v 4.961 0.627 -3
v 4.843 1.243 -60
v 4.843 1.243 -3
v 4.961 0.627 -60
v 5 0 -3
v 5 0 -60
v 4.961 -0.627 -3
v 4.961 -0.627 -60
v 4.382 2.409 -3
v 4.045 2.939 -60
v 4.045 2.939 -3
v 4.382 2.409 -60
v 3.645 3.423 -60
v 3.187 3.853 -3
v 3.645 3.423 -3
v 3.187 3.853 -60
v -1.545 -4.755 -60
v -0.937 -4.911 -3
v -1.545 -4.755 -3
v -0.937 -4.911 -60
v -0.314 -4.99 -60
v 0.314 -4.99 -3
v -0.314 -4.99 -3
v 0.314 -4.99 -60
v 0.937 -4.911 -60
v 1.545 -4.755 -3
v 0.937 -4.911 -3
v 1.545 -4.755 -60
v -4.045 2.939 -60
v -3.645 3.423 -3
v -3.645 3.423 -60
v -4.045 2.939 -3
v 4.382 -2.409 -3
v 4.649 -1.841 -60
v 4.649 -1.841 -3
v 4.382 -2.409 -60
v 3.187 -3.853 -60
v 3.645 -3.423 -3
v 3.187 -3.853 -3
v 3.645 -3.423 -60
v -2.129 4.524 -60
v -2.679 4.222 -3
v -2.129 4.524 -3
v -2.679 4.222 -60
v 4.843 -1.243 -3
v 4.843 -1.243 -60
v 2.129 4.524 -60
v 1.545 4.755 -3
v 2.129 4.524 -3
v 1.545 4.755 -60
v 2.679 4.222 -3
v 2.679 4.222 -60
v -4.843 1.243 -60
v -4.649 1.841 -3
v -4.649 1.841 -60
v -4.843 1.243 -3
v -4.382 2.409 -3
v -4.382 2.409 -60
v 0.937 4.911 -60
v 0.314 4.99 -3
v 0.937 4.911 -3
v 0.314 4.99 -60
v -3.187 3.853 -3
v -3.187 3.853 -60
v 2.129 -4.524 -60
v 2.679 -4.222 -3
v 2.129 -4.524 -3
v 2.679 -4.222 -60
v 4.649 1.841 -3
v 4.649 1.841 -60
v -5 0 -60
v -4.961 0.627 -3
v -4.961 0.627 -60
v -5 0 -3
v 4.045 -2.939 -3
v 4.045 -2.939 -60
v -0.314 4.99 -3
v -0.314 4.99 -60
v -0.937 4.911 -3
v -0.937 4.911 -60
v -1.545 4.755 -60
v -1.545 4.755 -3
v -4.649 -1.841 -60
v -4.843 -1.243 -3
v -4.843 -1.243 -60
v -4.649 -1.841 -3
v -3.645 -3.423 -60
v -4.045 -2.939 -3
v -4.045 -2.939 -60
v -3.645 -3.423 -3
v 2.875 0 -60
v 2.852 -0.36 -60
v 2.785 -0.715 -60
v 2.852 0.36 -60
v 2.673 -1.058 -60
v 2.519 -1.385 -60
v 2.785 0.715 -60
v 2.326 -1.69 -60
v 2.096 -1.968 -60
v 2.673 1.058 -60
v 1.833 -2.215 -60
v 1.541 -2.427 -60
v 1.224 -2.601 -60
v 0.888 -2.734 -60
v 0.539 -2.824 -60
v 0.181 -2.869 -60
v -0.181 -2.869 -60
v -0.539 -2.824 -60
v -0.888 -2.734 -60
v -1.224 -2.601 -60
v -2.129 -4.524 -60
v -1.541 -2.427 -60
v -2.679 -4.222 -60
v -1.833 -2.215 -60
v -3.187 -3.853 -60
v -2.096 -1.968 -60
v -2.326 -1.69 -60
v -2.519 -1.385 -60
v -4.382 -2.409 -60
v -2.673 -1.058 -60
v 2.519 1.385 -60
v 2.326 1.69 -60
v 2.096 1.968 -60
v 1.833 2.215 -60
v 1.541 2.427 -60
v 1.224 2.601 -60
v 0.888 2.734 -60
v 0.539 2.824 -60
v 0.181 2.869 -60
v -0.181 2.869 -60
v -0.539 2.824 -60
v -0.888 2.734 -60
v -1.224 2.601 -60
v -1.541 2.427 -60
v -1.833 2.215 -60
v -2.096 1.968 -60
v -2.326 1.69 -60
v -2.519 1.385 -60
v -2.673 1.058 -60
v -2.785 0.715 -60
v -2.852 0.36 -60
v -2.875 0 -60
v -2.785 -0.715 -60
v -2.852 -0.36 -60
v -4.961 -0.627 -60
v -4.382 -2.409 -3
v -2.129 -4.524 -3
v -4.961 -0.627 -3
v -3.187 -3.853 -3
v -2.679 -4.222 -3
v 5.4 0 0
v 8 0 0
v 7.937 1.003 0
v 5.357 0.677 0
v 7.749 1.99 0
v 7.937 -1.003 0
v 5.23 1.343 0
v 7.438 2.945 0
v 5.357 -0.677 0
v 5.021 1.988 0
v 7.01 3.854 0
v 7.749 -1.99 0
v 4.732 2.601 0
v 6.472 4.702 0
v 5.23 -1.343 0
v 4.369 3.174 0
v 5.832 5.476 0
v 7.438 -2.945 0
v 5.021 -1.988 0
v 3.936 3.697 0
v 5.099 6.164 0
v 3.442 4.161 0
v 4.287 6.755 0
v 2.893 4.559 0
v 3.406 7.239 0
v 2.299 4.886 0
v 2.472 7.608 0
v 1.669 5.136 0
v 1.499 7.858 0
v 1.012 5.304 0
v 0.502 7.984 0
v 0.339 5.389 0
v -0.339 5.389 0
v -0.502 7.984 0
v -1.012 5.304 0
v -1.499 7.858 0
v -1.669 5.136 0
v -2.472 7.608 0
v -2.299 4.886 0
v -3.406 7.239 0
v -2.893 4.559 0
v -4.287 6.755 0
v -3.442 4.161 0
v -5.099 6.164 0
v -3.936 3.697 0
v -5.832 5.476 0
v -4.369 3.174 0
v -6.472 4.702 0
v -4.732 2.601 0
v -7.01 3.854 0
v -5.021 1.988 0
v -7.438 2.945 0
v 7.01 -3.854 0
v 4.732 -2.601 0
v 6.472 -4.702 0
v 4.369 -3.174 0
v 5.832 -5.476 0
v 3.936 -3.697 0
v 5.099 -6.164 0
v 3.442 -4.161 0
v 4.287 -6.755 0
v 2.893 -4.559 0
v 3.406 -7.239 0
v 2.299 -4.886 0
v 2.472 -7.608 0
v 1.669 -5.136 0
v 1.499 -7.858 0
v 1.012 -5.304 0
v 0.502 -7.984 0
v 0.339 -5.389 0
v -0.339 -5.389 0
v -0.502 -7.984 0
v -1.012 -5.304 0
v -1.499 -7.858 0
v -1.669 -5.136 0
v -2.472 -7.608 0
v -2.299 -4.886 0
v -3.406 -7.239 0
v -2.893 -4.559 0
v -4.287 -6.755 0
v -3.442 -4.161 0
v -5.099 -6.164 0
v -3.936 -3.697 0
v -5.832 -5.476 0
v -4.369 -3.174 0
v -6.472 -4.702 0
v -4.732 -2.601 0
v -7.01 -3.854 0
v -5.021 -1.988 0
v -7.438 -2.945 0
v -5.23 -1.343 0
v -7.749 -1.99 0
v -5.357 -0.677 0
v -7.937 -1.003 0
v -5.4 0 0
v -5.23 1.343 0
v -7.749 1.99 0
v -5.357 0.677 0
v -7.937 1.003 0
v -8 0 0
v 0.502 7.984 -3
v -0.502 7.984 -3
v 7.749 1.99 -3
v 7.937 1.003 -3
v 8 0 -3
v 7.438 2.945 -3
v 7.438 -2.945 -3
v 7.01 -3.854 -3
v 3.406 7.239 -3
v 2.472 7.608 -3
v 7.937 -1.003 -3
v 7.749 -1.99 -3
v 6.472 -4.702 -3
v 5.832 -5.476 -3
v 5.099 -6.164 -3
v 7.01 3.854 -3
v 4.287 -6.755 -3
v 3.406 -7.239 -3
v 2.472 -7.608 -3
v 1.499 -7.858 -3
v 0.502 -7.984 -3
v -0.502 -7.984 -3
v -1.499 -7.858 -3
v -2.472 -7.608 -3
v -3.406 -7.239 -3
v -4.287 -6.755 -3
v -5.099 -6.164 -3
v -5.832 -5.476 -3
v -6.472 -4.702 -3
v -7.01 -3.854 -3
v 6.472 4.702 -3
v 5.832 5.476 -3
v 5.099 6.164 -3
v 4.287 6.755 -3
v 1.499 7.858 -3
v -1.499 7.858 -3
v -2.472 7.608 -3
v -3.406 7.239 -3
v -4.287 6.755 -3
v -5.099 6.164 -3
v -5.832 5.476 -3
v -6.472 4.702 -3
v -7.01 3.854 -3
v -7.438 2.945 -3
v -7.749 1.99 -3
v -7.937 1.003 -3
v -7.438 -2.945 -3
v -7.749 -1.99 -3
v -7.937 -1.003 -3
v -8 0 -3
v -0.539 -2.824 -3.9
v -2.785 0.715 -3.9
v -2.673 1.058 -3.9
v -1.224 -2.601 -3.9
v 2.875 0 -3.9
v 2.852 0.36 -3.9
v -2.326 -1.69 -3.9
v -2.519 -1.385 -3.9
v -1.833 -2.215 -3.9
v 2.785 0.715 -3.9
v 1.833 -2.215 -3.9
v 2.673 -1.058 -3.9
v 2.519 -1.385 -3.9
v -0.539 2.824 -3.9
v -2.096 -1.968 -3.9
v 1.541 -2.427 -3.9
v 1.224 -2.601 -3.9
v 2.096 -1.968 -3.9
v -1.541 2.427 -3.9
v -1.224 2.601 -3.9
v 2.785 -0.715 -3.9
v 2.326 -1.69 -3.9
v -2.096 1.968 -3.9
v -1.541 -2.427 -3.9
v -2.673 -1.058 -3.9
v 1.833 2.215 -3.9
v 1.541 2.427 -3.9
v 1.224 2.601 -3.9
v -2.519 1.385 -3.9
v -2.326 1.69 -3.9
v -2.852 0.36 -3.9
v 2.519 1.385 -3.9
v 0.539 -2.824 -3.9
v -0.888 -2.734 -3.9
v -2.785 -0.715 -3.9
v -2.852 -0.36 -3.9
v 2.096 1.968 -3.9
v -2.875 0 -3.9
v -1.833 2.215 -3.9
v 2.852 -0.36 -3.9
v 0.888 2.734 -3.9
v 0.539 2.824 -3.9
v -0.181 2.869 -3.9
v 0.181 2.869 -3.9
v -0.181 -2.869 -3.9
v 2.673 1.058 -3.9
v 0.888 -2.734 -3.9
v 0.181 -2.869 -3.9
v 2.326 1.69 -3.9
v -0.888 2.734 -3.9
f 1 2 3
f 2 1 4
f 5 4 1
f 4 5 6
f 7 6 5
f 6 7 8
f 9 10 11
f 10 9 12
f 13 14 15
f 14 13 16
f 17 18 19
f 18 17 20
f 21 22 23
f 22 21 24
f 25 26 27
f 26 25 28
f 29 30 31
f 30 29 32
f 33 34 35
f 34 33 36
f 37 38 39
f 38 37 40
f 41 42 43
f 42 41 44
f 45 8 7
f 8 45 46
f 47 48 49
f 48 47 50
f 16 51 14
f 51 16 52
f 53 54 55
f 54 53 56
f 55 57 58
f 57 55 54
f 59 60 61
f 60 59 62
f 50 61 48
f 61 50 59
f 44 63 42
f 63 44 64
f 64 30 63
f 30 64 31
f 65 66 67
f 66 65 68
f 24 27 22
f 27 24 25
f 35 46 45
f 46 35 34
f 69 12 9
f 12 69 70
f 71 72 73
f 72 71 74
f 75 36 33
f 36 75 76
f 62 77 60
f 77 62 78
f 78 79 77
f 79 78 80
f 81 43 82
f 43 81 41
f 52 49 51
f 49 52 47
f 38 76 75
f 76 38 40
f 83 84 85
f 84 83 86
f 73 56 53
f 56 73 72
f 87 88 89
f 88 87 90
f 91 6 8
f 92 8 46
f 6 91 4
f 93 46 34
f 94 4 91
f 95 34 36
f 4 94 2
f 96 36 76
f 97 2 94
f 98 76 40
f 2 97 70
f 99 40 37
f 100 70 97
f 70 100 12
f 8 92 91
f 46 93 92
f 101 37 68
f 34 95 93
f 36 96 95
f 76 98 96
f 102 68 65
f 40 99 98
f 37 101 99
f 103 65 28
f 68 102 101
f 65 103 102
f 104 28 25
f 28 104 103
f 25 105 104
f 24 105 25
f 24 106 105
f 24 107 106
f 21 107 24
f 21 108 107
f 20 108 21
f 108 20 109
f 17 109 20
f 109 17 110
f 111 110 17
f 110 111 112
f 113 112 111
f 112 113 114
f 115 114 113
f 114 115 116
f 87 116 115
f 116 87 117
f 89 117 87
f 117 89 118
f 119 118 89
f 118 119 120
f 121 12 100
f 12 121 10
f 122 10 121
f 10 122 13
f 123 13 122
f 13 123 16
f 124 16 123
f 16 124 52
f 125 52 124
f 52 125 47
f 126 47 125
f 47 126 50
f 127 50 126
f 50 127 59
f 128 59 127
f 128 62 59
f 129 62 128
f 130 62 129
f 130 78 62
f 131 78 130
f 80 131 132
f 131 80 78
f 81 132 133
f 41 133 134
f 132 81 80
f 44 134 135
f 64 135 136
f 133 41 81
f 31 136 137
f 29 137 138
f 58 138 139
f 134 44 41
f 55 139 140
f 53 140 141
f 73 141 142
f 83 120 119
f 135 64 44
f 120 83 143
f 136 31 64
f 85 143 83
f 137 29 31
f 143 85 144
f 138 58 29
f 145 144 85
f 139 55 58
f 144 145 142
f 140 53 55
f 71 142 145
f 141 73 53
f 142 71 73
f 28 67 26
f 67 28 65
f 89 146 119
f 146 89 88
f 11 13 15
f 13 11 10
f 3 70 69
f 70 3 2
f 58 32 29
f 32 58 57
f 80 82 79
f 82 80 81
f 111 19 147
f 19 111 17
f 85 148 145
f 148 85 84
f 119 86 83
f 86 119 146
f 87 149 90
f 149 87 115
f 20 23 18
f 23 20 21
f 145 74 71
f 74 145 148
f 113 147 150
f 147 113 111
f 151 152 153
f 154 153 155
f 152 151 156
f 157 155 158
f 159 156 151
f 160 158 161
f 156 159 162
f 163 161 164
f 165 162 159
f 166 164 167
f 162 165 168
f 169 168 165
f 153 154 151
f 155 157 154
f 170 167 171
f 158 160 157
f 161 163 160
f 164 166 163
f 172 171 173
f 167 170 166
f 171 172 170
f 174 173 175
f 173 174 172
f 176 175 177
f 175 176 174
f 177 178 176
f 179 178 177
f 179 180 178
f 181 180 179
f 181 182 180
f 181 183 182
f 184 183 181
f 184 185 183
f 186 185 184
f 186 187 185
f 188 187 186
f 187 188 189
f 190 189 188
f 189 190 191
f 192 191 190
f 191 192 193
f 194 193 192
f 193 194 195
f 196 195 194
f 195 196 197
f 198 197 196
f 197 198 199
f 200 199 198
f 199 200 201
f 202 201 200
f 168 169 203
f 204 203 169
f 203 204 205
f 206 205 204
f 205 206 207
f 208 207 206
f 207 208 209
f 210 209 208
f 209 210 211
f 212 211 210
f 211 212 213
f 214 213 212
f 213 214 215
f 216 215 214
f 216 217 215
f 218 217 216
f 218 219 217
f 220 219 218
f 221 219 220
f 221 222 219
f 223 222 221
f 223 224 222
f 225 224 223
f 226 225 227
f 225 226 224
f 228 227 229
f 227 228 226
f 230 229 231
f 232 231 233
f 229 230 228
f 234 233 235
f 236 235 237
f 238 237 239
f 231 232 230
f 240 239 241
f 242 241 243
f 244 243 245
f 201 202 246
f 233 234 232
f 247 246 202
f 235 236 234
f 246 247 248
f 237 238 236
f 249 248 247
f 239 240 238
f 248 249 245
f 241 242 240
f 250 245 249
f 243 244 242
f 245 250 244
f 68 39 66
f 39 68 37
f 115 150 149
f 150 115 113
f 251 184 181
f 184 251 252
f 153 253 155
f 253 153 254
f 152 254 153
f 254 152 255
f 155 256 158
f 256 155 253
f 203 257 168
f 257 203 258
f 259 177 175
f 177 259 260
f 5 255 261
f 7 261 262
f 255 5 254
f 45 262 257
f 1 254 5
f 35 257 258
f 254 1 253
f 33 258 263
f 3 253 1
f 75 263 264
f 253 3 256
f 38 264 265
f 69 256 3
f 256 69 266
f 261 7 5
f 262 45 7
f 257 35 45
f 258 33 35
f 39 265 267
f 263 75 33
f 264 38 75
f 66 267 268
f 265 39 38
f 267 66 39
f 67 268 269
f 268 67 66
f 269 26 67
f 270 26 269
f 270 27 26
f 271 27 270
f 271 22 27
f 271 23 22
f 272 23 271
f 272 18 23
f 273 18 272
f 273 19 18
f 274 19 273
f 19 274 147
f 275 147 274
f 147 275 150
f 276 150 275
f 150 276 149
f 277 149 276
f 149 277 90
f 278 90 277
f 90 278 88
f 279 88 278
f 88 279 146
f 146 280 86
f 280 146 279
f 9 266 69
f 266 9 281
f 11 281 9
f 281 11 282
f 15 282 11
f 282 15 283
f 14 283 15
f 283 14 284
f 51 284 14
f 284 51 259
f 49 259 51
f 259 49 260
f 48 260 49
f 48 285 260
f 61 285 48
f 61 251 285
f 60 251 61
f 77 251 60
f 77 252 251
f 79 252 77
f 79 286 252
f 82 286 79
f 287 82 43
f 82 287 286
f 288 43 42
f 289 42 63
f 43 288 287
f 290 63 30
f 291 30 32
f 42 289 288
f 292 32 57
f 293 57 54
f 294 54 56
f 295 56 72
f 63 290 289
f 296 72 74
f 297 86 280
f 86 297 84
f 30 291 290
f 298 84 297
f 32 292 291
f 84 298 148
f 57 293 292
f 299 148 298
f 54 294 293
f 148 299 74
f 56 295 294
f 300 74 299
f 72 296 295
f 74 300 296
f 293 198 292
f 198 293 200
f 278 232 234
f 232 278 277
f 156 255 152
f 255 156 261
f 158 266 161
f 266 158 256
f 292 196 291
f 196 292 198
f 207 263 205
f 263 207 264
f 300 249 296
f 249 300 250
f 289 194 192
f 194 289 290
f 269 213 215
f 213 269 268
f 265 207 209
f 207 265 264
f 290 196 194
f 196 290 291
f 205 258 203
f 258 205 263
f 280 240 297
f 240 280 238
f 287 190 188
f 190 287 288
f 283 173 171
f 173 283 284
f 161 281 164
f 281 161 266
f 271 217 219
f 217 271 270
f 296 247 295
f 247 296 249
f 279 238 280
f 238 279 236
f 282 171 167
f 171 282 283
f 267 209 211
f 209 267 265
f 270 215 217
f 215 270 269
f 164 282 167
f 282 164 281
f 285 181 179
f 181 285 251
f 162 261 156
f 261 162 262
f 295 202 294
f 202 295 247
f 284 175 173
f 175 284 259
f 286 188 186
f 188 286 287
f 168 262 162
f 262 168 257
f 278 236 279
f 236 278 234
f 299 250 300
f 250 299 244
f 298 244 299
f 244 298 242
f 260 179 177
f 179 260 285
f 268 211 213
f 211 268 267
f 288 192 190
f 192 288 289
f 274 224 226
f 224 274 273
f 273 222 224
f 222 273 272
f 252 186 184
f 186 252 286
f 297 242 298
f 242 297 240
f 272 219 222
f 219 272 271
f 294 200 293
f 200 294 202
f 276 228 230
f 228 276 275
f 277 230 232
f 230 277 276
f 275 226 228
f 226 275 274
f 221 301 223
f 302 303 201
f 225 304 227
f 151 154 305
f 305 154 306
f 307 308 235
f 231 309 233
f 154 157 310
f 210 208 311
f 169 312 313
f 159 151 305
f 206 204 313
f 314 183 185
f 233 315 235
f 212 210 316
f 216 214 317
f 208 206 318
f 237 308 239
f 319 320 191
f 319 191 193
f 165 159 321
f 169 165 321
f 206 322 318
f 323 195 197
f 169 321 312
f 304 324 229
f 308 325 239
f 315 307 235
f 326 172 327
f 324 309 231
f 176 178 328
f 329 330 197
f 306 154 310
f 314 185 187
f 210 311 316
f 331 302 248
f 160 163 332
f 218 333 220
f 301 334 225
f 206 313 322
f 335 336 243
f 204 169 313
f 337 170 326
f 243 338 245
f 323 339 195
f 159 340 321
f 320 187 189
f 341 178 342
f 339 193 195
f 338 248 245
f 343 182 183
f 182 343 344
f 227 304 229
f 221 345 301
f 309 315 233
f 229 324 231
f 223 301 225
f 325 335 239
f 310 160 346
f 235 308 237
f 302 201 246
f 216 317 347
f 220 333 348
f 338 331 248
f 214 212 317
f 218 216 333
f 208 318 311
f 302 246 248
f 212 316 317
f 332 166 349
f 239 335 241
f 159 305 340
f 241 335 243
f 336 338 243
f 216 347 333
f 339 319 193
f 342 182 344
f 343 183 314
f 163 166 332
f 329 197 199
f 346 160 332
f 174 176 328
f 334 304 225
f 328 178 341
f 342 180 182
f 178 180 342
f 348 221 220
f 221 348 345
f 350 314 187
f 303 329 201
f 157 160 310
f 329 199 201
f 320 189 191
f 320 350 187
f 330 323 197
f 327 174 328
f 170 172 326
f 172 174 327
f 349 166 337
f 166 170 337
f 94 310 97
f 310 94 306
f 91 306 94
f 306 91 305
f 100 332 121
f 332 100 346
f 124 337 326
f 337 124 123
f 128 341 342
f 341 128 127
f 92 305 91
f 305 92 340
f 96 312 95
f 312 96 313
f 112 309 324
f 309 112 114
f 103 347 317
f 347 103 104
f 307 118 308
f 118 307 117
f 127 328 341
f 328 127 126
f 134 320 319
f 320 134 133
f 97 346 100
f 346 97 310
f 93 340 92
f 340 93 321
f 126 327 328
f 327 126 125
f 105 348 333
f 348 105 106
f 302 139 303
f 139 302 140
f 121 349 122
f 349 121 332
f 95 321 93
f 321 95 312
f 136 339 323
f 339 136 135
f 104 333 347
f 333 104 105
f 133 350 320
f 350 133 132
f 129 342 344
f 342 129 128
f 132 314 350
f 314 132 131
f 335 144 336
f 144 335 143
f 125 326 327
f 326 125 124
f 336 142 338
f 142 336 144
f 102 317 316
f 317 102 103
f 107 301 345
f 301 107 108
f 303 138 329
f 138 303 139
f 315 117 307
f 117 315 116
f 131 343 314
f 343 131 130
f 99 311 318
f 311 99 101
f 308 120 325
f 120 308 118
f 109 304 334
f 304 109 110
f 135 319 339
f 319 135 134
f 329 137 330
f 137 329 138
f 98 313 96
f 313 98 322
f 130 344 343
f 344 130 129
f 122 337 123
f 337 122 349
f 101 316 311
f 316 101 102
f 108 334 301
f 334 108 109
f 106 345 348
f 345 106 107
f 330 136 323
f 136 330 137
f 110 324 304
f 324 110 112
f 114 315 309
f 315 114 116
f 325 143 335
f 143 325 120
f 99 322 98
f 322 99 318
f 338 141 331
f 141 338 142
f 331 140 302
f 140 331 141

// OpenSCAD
$fn = 50;


difference() {
	union() {
		translate(v = [0, 0, -60.0000000000]) {
			cylinder(h = 60, r = 5.0000000000);
		}
		translate(v = [0, 0, -3.0000000000]) {
			cylinder(h = 3, r = 8.0000000000);
		}
	}
	union() {
		translate(v = [0, 0, 0]) {
			rotate(a = [0, 0, 0]) {
				difference() {
					union() {
						#translate(v = [0, 0, -60.0000000000]) {
							cylinder(h = 60, r = 2.6000000000);
						}
						#translate(v = [0, 0, -3.9000000000]) {
							cylinder(h = 3.9000000000, r1 = 2.8750000000, r2 = 5.4000000000);
						}
						#translate(v = [0, 0, -60.0000000000]) {
							cylinder(h = 60, r = 2.8750000000);
						}
						#translate(v = [0, 0, -60.0000000000]) {
							cylinder(h = 60, r = 2.6000000000);
						}
					}
					union();
				}
			}
		}
	}
}
